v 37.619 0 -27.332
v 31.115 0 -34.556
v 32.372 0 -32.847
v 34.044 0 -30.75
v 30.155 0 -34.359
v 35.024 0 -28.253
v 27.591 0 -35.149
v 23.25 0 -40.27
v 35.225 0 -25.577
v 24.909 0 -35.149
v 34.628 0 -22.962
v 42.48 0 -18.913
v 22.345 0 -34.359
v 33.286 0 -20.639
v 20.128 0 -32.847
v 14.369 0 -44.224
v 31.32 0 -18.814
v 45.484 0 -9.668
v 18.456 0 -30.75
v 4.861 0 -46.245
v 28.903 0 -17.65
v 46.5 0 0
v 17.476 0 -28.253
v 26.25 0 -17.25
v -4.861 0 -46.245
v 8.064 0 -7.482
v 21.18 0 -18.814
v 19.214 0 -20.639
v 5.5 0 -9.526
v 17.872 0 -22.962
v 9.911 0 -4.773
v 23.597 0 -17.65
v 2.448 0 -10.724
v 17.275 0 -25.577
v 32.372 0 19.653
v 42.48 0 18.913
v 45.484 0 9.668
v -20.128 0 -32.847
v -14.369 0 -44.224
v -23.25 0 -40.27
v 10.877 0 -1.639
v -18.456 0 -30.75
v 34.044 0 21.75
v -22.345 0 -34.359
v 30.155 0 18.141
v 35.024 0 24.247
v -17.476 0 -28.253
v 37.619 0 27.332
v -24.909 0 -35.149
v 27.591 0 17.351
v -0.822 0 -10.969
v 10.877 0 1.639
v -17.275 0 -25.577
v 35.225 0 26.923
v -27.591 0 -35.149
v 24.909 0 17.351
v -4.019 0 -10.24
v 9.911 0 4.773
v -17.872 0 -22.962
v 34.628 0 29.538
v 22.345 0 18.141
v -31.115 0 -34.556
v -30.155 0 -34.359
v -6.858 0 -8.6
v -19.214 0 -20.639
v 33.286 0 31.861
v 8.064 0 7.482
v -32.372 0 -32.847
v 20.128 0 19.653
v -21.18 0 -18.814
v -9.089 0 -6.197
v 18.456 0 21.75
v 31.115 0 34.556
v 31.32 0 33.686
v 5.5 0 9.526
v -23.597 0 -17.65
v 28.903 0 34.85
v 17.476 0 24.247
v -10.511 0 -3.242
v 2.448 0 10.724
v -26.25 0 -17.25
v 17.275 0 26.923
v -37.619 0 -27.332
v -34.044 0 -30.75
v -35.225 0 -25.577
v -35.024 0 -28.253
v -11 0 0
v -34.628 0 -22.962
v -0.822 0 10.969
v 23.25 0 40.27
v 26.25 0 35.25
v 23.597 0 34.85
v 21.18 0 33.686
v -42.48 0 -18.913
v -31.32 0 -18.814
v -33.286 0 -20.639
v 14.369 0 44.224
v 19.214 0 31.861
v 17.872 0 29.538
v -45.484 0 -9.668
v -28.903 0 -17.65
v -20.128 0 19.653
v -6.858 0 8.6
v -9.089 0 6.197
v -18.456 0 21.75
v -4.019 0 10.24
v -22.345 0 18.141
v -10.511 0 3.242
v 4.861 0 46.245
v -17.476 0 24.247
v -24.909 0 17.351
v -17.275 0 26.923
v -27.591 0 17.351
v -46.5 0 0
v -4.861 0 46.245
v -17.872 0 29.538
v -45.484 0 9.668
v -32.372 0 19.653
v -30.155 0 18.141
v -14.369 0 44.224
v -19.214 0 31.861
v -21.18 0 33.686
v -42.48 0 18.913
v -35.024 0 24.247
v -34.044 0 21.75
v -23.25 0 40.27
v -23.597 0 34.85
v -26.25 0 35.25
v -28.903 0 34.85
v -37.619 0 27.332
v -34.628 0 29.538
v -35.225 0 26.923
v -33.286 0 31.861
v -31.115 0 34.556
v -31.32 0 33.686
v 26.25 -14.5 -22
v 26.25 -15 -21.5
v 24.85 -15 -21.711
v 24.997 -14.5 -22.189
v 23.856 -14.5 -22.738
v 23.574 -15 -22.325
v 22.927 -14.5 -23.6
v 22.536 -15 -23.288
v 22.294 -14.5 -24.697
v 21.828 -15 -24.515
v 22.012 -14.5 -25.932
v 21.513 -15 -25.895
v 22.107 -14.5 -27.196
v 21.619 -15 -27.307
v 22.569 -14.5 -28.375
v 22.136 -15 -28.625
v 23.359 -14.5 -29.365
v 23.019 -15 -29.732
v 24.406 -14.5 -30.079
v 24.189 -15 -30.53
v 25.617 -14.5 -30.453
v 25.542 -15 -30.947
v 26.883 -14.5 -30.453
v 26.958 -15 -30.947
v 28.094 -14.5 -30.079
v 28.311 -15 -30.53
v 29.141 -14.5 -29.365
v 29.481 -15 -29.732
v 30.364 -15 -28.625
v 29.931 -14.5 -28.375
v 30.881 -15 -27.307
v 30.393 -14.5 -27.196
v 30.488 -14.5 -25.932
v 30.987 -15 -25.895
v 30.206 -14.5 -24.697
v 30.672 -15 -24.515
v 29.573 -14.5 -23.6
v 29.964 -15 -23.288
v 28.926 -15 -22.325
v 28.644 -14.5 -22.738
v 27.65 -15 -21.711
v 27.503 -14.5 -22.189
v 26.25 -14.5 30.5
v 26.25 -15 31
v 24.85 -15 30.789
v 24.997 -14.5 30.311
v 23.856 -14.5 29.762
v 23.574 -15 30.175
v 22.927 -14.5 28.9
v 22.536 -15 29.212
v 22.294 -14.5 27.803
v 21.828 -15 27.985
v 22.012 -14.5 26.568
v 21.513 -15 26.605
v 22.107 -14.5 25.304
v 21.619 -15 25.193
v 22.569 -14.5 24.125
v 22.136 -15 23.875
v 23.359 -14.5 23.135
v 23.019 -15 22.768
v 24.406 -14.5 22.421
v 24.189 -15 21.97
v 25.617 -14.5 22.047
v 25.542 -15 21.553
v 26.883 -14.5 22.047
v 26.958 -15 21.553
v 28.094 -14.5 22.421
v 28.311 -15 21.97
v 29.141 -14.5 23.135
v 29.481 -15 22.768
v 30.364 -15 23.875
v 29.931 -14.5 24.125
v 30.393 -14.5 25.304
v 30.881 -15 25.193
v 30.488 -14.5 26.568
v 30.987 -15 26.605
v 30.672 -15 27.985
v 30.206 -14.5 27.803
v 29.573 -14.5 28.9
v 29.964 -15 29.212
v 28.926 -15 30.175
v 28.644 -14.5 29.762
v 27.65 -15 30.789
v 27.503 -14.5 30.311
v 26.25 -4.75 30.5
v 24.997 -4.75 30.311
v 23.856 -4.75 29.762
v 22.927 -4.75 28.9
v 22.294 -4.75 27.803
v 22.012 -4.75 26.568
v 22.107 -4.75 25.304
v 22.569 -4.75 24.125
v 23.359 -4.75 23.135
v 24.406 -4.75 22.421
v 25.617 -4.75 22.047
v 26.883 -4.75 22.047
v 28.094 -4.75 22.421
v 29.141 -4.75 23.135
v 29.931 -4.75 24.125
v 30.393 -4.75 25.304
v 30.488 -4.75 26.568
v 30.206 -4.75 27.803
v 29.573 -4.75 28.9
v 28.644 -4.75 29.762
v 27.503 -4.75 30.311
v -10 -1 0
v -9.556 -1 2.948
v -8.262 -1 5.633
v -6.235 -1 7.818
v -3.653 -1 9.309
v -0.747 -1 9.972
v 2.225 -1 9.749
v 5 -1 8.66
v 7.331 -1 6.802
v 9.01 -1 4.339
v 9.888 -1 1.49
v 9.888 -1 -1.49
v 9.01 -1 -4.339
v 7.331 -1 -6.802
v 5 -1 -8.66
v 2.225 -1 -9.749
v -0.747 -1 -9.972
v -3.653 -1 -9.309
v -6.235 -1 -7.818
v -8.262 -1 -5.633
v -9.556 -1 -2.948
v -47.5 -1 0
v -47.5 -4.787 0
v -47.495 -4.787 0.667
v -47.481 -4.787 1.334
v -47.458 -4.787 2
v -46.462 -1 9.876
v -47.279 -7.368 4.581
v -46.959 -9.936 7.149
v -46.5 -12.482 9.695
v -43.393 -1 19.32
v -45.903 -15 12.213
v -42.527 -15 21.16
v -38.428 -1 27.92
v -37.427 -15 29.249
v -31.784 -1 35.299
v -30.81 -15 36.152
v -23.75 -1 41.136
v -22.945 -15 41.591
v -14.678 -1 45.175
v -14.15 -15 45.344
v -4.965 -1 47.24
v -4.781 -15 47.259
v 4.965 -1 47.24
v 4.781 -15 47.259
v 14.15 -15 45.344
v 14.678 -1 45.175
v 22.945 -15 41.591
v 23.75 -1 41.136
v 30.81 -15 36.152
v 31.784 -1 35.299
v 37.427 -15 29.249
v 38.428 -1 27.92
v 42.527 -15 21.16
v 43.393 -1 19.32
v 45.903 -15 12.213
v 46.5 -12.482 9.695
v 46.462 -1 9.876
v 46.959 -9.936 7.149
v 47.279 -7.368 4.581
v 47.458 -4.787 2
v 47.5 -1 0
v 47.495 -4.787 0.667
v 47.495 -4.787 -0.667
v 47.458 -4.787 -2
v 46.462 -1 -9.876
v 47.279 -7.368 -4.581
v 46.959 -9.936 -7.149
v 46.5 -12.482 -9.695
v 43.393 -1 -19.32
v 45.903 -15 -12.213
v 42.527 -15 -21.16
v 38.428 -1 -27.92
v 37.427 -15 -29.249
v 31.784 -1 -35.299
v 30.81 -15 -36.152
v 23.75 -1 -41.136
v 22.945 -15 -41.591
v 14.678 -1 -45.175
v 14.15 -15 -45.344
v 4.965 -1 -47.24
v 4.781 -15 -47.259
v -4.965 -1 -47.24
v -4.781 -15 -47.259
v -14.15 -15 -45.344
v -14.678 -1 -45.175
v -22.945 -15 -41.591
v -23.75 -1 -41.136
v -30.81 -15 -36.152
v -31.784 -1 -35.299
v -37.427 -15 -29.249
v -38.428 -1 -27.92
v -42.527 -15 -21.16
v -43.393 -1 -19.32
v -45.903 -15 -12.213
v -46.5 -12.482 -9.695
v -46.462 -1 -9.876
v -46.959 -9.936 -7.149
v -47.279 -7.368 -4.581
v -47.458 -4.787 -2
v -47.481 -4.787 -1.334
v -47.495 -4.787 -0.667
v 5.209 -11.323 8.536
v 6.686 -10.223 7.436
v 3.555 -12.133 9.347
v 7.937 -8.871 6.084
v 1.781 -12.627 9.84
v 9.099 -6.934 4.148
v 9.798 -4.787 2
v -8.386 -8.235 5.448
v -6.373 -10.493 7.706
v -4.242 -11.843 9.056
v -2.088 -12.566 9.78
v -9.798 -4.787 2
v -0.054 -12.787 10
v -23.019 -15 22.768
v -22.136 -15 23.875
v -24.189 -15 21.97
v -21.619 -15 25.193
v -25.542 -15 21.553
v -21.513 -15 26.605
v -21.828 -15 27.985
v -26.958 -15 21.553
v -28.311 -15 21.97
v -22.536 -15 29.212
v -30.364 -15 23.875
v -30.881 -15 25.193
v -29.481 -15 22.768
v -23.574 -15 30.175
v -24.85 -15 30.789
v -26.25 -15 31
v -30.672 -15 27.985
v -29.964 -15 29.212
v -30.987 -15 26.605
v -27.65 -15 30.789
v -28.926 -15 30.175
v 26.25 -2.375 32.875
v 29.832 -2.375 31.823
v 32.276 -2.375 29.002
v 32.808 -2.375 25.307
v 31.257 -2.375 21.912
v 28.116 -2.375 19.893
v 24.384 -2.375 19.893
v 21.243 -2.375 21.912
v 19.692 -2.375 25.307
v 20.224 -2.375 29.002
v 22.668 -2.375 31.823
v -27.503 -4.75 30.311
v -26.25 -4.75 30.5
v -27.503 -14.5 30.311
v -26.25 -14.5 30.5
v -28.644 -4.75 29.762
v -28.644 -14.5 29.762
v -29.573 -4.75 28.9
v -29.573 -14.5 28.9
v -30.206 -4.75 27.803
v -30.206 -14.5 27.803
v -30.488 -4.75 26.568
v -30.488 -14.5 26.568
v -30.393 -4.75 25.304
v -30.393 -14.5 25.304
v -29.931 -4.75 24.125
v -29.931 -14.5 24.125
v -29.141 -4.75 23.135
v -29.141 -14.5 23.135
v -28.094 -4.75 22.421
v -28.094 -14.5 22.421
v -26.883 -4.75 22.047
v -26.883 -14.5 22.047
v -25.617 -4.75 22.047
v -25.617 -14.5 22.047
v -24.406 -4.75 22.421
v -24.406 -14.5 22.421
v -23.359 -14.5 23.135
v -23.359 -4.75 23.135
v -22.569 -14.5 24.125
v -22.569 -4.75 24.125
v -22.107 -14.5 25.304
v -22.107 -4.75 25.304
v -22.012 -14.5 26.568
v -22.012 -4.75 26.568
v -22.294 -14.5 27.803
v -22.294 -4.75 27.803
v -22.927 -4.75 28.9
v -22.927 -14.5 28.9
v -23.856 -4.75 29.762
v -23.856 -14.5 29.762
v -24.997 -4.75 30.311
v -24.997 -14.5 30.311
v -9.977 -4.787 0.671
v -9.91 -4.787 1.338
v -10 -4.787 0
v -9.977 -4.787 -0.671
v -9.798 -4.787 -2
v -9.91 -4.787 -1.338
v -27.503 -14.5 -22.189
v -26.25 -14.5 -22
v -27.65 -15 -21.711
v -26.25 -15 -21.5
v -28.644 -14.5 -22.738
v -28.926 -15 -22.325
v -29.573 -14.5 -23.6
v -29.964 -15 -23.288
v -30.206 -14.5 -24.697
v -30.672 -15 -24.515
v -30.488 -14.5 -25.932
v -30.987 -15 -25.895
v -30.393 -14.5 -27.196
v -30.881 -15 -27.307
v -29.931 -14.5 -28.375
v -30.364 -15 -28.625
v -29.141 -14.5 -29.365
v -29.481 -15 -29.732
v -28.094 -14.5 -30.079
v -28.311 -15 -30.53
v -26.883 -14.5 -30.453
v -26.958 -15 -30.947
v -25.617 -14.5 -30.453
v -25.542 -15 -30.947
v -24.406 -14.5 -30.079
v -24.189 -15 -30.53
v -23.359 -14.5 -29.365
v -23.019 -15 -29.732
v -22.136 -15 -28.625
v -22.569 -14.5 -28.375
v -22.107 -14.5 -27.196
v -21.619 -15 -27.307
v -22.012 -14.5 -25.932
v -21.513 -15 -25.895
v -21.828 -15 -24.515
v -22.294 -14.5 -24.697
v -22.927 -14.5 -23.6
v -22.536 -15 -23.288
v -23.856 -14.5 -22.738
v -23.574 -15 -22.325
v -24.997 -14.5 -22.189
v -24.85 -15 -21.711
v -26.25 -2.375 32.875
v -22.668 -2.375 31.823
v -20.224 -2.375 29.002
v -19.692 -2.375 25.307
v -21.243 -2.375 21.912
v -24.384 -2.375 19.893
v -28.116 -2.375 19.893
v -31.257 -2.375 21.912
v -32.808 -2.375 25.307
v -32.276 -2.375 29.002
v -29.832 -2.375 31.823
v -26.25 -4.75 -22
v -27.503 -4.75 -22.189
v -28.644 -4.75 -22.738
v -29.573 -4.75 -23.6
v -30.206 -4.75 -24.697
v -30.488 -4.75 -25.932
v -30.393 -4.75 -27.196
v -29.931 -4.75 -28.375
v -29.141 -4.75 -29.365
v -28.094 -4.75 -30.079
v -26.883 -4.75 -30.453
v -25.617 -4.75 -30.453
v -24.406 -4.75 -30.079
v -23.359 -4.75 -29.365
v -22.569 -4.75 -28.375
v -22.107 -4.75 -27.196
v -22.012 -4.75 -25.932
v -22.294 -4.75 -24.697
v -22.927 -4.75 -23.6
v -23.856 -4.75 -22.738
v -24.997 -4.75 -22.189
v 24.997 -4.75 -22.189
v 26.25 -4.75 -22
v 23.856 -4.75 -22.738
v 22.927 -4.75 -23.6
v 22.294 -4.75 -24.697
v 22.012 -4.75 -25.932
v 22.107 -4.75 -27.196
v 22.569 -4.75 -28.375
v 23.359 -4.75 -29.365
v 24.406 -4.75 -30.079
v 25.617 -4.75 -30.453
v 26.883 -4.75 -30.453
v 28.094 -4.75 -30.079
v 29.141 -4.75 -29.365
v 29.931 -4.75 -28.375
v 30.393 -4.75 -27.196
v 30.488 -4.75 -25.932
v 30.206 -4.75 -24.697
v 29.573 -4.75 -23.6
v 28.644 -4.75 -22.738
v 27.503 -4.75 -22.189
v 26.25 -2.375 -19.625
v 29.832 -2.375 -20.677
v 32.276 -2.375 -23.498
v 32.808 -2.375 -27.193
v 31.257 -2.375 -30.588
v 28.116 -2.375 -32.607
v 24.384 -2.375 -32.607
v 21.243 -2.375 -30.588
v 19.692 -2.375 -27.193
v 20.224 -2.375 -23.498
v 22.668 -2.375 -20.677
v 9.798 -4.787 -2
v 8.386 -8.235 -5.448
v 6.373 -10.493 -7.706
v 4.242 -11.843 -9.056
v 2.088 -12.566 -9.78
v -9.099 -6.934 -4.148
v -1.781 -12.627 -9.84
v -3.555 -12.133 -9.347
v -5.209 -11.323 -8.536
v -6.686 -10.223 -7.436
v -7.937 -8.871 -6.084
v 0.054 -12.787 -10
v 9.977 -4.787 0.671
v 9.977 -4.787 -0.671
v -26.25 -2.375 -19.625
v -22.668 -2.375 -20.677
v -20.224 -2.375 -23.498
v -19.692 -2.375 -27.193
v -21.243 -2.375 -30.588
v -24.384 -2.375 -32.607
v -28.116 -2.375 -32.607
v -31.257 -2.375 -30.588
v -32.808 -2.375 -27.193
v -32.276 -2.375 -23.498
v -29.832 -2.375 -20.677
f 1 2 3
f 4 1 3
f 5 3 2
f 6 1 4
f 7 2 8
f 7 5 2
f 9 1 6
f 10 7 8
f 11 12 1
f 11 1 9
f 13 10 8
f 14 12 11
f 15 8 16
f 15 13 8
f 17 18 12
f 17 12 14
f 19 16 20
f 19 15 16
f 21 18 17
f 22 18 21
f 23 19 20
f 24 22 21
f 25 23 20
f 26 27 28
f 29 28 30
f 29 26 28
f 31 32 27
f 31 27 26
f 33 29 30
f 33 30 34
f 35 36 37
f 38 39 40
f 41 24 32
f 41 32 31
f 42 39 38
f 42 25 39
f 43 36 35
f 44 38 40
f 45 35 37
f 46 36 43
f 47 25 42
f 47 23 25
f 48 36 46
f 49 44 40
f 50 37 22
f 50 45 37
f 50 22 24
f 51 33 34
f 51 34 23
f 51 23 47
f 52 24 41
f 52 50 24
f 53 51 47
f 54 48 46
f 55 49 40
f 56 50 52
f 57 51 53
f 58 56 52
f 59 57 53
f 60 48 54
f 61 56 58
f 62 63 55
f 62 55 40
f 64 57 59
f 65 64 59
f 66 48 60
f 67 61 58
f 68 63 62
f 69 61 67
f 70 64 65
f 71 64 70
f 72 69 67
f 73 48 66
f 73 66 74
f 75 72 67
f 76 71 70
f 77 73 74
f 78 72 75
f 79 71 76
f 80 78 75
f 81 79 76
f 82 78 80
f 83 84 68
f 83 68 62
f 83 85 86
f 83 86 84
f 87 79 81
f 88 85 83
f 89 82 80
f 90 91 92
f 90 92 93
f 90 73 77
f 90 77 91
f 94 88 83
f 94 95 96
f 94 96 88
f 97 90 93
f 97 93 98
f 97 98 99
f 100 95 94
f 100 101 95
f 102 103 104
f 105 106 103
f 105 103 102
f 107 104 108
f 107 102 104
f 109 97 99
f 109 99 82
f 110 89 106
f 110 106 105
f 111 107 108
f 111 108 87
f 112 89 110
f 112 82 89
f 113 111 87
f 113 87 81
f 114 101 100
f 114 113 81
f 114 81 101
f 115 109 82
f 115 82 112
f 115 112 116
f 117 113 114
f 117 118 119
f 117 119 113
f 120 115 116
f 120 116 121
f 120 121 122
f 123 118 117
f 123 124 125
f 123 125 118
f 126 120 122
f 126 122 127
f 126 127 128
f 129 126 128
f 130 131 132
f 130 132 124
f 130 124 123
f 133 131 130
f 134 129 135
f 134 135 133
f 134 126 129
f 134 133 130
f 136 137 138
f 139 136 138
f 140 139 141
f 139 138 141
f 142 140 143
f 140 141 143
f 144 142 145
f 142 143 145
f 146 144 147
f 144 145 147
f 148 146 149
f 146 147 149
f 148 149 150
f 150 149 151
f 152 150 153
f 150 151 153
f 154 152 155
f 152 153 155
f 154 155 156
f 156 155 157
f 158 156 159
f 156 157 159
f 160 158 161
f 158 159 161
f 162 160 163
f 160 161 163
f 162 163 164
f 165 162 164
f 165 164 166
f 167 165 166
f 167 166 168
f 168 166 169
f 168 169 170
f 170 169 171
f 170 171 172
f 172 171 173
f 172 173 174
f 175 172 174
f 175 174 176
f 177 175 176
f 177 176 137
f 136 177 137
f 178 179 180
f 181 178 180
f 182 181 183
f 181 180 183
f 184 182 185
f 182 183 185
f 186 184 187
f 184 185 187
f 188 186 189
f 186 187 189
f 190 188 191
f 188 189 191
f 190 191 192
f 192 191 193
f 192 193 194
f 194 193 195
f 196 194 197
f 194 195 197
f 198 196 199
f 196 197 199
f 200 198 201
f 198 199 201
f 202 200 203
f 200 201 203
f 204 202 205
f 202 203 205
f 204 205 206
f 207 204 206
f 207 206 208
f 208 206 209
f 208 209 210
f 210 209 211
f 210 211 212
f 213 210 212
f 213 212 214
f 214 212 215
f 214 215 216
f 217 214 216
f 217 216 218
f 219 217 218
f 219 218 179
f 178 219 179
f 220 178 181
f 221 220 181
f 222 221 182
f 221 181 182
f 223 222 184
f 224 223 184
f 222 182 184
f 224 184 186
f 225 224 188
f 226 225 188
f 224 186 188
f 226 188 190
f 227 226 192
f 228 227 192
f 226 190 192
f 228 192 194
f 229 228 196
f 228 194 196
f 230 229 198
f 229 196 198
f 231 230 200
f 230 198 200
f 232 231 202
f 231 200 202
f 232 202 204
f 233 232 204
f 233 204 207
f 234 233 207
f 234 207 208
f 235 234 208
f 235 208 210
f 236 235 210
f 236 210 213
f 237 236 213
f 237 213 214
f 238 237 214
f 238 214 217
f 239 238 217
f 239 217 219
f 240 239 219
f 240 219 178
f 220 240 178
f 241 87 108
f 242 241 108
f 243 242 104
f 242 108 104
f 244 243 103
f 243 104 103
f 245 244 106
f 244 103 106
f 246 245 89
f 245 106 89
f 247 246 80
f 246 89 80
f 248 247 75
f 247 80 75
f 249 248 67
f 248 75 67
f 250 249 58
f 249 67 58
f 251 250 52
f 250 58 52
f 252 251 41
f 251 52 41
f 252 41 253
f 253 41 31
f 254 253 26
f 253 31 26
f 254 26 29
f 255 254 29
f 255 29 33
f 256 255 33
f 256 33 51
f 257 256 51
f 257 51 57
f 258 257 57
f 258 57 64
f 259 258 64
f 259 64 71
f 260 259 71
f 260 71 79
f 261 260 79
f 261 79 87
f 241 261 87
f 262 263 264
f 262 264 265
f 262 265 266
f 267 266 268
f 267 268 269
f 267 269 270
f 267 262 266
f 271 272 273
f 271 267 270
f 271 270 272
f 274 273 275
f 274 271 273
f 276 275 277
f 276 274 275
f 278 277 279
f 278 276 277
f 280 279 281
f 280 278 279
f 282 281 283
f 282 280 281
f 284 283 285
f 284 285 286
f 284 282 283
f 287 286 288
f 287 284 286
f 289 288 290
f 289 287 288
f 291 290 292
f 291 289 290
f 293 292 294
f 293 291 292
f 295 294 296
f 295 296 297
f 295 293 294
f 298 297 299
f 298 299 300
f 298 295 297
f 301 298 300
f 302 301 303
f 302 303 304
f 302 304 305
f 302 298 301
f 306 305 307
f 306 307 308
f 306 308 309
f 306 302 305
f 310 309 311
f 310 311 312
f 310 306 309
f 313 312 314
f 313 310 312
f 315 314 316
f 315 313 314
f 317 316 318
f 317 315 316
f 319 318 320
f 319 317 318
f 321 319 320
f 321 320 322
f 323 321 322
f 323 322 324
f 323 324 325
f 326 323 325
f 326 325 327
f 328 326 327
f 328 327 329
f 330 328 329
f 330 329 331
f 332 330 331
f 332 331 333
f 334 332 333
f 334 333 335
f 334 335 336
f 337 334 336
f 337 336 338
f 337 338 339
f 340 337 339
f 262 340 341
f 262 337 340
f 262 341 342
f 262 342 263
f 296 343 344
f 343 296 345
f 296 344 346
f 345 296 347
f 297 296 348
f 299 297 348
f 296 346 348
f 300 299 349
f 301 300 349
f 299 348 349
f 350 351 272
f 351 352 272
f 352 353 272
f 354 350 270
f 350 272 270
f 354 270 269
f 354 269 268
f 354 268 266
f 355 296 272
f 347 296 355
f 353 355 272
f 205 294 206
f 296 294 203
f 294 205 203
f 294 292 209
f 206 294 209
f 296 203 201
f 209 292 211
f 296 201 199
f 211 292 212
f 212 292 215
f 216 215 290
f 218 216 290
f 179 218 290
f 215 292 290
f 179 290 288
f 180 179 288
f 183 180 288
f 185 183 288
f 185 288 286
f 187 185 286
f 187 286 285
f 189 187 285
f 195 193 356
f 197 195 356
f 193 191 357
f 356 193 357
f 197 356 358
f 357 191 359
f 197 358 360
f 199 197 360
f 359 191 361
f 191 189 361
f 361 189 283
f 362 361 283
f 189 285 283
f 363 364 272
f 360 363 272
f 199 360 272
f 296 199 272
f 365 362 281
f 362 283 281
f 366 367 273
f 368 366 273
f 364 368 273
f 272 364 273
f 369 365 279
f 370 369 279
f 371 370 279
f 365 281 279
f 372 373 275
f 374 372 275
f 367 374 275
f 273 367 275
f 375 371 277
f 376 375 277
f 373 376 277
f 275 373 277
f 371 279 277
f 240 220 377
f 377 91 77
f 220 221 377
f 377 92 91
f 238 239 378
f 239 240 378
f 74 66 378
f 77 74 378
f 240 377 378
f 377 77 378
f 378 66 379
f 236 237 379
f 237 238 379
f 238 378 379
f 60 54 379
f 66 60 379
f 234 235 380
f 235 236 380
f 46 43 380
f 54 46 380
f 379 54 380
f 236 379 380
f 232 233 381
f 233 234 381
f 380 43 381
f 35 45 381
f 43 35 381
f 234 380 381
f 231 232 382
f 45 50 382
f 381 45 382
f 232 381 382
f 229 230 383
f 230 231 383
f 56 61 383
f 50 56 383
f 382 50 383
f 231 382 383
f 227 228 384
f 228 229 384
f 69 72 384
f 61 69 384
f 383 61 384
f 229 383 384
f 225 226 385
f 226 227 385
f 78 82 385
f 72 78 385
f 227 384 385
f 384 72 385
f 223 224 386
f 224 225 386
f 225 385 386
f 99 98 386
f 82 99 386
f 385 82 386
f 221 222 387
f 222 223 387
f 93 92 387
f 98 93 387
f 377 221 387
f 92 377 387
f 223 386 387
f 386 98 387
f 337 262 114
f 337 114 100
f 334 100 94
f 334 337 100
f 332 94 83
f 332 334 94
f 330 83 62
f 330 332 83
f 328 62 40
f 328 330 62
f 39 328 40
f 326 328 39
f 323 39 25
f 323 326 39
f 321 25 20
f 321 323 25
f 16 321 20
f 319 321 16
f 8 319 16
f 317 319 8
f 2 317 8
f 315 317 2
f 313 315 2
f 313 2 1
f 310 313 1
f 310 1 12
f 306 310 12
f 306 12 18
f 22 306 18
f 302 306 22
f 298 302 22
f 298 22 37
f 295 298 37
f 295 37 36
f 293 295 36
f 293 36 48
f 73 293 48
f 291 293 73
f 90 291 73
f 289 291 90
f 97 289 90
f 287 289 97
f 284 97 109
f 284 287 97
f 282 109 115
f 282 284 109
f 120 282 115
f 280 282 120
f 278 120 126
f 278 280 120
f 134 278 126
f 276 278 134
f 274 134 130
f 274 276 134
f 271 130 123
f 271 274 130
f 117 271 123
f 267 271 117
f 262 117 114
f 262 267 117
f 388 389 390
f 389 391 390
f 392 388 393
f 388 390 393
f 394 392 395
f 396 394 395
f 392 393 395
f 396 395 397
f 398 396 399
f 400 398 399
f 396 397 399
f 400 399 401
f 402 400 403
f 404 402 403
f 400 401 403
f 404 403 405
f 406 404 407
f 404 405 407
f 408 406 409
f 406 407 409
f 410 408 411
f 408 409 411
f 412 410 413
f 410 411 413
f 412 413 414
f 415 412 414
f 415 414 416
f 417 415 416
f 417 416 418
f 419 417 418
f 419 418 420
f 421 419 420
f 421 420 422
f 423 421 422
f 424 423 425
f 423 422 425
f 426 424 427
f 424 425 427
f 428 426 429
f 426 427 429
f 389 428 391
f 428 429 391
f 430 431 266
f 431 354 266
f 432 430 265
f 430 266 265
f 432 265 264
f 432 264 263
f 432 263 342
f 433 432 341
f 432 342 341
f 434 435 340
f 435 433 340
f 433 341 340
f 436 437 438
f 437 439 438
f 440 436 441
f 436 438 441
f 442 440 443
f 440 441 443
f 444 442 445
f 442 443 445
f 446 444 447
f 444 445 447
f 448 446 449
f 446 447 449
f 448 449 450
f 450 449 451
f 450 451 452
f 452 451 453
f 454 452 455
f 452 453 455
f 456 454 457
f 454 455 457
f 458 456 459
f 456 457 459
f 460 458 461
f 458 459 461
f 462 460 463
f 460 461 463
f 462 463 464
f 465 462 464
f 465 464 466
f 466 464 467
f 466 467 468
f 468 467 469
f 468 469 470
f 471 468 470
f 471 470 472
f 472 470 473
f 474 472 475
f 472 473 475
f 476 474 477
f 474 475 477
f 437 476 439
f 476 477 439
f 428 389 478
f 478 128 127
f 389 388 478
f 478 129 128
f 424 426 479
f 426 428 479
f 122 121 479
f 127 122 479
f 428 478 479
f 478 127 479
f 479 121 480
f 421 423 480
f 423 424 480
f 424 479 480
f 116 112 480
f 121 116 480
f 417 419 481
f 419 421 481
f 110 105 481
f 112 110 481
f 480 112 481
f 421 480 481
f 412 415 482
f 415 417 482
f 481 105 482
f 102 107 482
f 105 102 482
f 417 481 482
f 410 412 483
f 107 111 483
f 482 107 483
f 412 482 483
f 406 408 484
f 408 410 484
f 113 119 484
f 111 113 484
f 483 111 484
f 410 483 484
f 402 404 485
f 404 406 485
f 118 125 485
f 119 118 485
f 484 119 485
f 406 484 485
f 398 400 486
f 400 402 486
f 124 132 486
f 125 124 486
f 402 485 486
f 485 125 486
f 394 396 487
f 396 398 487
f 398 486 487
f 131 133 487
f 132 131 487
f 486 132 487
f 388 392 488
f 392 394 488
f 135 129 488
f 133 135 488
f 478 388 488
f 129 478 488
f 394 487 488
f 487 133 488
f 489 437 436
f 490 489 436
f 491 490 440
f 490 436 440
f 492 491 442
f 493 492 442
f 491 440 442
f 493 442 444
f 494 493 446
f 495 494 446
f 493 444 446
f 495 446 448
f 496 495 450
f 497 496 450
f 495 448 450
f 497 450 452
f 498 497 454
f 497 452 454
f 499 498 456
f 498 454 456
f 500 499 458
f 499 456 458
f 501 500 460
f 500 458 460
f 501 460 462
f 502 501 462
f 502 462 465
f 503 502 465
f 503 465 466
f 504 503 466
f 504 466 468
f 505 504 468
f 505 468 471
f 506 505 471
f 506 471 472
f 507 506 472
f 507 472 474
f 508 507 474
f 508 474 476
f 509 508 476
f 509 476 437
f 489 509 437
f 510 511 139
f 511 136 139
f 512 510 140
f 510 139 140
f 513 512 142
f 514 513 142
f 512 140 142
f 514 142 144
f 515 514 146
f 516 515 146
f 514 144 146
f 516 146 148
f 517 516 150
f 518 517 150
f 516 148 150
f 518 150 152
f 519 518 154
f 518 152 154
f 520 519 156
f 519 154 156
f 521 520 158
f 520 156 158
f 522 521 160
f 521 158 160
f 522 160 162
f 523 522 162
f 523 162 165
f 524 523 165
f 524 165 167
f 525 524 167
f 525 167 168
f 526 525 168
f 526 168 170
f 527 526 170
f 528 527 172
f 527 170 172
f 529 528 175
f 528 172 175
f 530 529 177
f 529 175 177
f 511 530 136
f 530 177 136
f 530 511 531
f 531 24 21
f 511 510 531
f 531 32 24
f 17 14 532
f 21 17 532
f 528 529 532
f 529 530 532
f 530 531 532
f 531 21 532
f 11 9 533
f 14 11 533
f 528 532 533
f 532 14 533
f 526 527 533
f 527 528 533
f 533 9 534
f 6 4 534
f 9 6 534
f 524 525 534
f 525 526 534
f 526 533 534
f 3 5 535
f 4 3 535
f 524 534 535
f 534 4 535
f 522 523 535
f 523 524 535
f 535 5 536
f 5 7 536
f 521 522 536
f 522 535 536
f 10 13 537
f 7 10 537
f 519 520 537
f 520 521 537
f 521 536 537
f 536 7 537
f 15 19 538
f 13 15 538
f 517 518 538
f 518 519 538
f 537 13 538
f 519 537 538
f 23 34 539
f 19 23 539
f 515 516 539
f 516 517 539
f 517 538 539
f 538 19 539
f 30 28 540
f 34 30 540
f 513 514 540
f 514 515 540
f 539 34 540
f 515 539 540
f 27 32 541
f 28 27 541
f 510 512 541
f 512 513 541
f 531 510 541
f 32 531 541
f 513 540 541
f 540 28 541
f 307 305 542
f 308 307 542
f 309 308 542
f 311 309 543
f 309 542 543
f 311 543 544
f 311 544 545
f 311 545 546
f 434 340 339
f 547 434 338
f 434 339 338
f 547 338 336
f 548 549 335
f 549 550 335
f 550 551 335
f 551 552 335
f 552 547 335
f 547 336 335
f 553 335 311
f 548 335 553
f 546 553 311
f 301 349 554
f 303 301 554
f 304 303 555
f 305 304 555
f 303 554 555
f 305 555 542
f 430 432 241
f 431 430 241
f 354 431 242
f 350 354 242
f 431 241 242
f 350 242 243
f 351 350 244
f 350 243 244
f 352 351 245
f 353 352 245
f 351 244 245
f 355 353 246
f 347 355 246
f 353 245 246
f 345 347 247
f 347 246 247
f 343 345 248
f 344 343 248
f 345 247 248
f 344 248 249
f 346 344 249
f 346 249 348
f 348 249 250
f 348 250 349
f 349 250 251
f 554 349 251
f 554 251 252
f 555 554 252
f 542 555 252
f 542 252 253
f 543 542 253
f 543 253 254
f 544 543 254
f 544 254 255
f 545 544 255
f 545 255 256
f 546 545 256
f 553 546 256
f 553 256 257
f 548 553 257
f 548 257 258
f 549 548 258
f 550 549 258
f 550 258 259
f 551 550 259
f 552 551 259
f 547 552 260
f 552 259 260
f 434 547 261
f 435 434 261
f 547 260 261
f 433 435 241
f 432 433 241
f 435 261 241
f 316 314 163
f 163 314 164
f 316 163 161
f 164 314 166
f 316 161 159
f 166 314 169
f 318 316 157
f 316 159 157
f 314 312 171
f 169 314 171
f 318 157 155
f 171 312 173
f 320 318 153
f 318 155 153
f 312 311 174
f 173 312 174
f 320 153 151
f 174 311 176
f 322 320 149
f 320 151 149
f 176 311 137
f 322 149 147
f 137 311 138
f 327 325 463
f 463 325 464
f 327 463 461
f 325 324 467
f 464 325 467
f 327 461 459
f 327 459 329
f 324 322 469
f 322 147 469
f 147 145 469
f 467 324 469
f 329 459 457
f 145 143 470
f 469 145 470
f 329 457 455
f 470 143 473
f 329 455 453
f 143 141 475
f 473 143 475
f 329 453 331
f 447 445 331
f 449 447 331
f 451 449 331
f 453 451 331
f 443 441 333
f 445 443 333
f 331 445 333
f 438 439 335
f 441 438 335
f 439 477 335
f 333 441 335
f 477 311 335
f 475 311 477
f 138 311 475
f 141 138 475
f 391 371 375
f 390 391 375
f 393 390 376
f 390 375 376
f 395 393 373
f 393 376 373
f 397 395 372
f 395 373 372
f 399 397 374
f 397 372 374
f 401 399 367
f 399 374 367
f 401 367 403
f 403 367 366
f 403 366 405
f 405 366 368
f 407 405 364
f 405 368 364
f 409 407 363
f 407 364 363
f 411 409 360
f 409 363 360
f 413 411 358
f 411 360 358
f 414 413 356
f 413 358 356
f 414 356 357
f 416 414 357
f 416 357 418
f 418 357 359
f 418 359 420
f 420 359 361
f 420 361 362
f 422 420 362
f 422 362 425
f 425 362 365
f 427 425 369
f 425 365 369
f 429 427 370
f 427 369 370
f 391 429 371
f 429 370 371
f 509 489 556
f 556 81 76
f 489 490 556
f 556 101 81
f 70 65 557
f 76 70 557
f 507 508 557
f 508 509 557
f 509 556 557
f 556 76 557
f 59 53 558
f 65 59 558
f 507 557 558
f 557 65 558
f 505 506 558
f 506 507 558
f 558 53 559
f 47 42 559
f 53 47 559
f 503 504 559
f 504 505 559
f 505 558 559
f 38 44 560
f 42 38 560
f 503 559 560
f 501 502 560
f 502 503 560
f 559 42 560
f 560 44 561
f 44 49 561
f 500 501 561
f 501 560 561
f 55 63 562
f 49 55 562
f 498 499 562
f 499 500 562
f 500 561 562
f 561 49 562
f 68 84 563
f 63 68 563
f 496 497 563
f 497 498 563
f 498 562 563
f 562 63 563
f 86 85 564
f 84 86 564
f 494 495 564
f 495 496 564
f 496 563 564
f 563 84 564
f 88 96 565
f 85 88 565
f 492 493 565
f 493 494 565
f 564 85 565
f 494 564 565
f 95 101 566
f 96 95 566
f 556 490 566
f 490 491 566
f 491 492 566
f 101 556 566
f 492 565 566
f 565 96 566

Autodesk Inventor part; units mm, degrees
ref_plane "YZ Plane" through (0, 0, 0) normal (1, 0, 0) x (0, 1, 0)
ref_plane "XZ Plane" through (0, 0, 0) normal (0, 1, 0) x (-1, 0, 0)
ref_plane "XY Plane" through (0, 0, 0) normal (0, 0, 1) x (1, 0, 0)
sketch "Sketch1" plane through (0, 0, 0) normal (0, 1, 0) x (-1, 0, 0)
  circle A0 centre (0, 0) radius 47.5
  circle A1 centre (0, 0) radius 10
  line L0 (-26.25, 26.25) -> (26.25, 26.25) construction
  line L1 (26.25, 26.25) -> (26.25, -26.25) construction
  line L2 (26.25, -26.25) -> (-26.25, -26.25) construction
  line L3 (-26.25, -26.25) -> (-26.25, 26.25) construction
  line L4 (-26.25, 26.25) -> (26.25, -26.25) construction
  line L5 (26.25, 26.25) -> (-26.25, -26.25) construction
  dimension "d0" = 95
  dimension "d1" = 20
  dimension "d33" = 52.5
extrude "Extrusion1" add sketch "Sketch1" against normal blind 15
hole "Hole1" at (-26.25, 0, -26.25) at (26.25, 0, -26.25) at (26.25, 0, 26.25) at (-26.25, 0, 26.25) direction (0, -1, 0) diameter 8.5 end through all countersink diameter 18 countersink angle 90 clearance for "Countersunk Flat Head Screw ISO 2009/7046" size "M8" standard "ISO"
sketch "Sketch2" plane through (0, 0, 0) normal (1, 0, 0) x (0, 1, 0)
  line L0 (-15, 47.5) -> (-15, -47.5) projected
  line L1 (0, -47.5) -> (0, 47.5) construction
  line L2 (0, 47.5) -> (-15, 47.5) construction
  line L3 (0, -47.5) -> (-15, -47.5) construction
  line L4 (-46.8, 0) -> (7.8, 0) construction
  circle A0 centre (-24, 0) radius 15 construction
  line L5 (-15, 12.2132) -> (-4.7868, 2)
  line L6 (-4.7868, 2) -> (-4.7868, -2)
  line L7 (-4.7868, -2) -> (-15, -12.2132)
  point P0 (0, 0)
  point P1 (-4.7868, 0)
  dimension "d12" = 30
  dimension "d13" = 6
  dimension "d14" = 45
  dimension "d15" = 4
extrude "Extrusion2" cut sketch "Sketch2" along normal through all both and the other way through all
chamfer "Chamfer1" distance 1 angle 45 2 edges at (10, 0, 0) (47.5, 0, 0)
chamfer "Chamfer3" distance 0.5 angle 45 4 edges at (26.25, -15, -30.5) (-26.25, -15, -30.5) (26.25, -15, 22) (-26.25, -15, 22)
sketch "Sketch3" plane through (45.903, -15, 12.2132) normal (0, -0.7071, -0.7071) x (-1, 0, 0)
  ellipse E0 centre (45.903, 17.2721) end of major axis (45.903, 3.1299) minor radius 10 (36.1051, 14.4437) -> (55.701, 14.4437) ccw construction
  line L0 (-1.5549, 14.4437) -> (36.1051, 14.4437) construction
  ellipse E1 centre (45.903, 17.2721) end of major axis (45.903, 84.4472) minor radius 47.5 (-1.5549, 14.4437) -> (0, 0) ccw construction
  line L1 (91.806, 0) -> (0, 0) construction
  ellipse E2 centre (45.903, 17.2721) end of major axis (45.903, 84.4472) minor radius 47.5 (91.806, 0) -> (93.3609, 14.4437) ccw construction
  line L2 (55.701, 14.4437) -> (93.3609, 14.4437) construction
  line L3 (92.6036, 5) -> (-0.7976, 5)
  line L4 (93.1239, 10) -> (-1.3178, 10)
  line L5 (-1.5549, 14.4437) -> (93.3609, 14.4437)
  point P0 (45.903, 19.2426)
  dimension "d27" = 5
  dimension "d30" = 5
  dimension "d31" = 4.4436
sketch "Sketch4" plane through (-45.903, -15, -12.2132) normal (0, -0.7071, 0.7071) x (1, 0, 0)
  ellipse E0 centre (45.903, 17.2721) end of major axis (45.903, -49.9031) minor radius 47.5 (-1.5549, 14.4437) -> (0, 0) ccw construction
  ellipse E1 centre (45.903, 17.2721) end of major axis (45.903, -49.9031) minor radius 47.5 (91.806, 0) -> (93.3609, 14.4437) ccw construction
  line L0 (92.6036, 5) -> (-0.7976, 5)
  line L1 (91.806, 0) -> (0, 0) construction
  line L2 (93.3609, 14.4437) -> (-1.5549, 14.4437)
  line L3 (-1.3178, 10) -> (93.1239, 10)
  point P0 (45.903, 19.2426)
  dimension "d29" = 5
  dimension "d32" = 5
equation "\"d33\" = holeL"
equation "\"d30\" = d27"
equation "\"d29\" = d27"
equation "\"d32\" = d27"
equation "\"holeL\" = 52.5"
properties part number "HM1_FIXT1-002"
